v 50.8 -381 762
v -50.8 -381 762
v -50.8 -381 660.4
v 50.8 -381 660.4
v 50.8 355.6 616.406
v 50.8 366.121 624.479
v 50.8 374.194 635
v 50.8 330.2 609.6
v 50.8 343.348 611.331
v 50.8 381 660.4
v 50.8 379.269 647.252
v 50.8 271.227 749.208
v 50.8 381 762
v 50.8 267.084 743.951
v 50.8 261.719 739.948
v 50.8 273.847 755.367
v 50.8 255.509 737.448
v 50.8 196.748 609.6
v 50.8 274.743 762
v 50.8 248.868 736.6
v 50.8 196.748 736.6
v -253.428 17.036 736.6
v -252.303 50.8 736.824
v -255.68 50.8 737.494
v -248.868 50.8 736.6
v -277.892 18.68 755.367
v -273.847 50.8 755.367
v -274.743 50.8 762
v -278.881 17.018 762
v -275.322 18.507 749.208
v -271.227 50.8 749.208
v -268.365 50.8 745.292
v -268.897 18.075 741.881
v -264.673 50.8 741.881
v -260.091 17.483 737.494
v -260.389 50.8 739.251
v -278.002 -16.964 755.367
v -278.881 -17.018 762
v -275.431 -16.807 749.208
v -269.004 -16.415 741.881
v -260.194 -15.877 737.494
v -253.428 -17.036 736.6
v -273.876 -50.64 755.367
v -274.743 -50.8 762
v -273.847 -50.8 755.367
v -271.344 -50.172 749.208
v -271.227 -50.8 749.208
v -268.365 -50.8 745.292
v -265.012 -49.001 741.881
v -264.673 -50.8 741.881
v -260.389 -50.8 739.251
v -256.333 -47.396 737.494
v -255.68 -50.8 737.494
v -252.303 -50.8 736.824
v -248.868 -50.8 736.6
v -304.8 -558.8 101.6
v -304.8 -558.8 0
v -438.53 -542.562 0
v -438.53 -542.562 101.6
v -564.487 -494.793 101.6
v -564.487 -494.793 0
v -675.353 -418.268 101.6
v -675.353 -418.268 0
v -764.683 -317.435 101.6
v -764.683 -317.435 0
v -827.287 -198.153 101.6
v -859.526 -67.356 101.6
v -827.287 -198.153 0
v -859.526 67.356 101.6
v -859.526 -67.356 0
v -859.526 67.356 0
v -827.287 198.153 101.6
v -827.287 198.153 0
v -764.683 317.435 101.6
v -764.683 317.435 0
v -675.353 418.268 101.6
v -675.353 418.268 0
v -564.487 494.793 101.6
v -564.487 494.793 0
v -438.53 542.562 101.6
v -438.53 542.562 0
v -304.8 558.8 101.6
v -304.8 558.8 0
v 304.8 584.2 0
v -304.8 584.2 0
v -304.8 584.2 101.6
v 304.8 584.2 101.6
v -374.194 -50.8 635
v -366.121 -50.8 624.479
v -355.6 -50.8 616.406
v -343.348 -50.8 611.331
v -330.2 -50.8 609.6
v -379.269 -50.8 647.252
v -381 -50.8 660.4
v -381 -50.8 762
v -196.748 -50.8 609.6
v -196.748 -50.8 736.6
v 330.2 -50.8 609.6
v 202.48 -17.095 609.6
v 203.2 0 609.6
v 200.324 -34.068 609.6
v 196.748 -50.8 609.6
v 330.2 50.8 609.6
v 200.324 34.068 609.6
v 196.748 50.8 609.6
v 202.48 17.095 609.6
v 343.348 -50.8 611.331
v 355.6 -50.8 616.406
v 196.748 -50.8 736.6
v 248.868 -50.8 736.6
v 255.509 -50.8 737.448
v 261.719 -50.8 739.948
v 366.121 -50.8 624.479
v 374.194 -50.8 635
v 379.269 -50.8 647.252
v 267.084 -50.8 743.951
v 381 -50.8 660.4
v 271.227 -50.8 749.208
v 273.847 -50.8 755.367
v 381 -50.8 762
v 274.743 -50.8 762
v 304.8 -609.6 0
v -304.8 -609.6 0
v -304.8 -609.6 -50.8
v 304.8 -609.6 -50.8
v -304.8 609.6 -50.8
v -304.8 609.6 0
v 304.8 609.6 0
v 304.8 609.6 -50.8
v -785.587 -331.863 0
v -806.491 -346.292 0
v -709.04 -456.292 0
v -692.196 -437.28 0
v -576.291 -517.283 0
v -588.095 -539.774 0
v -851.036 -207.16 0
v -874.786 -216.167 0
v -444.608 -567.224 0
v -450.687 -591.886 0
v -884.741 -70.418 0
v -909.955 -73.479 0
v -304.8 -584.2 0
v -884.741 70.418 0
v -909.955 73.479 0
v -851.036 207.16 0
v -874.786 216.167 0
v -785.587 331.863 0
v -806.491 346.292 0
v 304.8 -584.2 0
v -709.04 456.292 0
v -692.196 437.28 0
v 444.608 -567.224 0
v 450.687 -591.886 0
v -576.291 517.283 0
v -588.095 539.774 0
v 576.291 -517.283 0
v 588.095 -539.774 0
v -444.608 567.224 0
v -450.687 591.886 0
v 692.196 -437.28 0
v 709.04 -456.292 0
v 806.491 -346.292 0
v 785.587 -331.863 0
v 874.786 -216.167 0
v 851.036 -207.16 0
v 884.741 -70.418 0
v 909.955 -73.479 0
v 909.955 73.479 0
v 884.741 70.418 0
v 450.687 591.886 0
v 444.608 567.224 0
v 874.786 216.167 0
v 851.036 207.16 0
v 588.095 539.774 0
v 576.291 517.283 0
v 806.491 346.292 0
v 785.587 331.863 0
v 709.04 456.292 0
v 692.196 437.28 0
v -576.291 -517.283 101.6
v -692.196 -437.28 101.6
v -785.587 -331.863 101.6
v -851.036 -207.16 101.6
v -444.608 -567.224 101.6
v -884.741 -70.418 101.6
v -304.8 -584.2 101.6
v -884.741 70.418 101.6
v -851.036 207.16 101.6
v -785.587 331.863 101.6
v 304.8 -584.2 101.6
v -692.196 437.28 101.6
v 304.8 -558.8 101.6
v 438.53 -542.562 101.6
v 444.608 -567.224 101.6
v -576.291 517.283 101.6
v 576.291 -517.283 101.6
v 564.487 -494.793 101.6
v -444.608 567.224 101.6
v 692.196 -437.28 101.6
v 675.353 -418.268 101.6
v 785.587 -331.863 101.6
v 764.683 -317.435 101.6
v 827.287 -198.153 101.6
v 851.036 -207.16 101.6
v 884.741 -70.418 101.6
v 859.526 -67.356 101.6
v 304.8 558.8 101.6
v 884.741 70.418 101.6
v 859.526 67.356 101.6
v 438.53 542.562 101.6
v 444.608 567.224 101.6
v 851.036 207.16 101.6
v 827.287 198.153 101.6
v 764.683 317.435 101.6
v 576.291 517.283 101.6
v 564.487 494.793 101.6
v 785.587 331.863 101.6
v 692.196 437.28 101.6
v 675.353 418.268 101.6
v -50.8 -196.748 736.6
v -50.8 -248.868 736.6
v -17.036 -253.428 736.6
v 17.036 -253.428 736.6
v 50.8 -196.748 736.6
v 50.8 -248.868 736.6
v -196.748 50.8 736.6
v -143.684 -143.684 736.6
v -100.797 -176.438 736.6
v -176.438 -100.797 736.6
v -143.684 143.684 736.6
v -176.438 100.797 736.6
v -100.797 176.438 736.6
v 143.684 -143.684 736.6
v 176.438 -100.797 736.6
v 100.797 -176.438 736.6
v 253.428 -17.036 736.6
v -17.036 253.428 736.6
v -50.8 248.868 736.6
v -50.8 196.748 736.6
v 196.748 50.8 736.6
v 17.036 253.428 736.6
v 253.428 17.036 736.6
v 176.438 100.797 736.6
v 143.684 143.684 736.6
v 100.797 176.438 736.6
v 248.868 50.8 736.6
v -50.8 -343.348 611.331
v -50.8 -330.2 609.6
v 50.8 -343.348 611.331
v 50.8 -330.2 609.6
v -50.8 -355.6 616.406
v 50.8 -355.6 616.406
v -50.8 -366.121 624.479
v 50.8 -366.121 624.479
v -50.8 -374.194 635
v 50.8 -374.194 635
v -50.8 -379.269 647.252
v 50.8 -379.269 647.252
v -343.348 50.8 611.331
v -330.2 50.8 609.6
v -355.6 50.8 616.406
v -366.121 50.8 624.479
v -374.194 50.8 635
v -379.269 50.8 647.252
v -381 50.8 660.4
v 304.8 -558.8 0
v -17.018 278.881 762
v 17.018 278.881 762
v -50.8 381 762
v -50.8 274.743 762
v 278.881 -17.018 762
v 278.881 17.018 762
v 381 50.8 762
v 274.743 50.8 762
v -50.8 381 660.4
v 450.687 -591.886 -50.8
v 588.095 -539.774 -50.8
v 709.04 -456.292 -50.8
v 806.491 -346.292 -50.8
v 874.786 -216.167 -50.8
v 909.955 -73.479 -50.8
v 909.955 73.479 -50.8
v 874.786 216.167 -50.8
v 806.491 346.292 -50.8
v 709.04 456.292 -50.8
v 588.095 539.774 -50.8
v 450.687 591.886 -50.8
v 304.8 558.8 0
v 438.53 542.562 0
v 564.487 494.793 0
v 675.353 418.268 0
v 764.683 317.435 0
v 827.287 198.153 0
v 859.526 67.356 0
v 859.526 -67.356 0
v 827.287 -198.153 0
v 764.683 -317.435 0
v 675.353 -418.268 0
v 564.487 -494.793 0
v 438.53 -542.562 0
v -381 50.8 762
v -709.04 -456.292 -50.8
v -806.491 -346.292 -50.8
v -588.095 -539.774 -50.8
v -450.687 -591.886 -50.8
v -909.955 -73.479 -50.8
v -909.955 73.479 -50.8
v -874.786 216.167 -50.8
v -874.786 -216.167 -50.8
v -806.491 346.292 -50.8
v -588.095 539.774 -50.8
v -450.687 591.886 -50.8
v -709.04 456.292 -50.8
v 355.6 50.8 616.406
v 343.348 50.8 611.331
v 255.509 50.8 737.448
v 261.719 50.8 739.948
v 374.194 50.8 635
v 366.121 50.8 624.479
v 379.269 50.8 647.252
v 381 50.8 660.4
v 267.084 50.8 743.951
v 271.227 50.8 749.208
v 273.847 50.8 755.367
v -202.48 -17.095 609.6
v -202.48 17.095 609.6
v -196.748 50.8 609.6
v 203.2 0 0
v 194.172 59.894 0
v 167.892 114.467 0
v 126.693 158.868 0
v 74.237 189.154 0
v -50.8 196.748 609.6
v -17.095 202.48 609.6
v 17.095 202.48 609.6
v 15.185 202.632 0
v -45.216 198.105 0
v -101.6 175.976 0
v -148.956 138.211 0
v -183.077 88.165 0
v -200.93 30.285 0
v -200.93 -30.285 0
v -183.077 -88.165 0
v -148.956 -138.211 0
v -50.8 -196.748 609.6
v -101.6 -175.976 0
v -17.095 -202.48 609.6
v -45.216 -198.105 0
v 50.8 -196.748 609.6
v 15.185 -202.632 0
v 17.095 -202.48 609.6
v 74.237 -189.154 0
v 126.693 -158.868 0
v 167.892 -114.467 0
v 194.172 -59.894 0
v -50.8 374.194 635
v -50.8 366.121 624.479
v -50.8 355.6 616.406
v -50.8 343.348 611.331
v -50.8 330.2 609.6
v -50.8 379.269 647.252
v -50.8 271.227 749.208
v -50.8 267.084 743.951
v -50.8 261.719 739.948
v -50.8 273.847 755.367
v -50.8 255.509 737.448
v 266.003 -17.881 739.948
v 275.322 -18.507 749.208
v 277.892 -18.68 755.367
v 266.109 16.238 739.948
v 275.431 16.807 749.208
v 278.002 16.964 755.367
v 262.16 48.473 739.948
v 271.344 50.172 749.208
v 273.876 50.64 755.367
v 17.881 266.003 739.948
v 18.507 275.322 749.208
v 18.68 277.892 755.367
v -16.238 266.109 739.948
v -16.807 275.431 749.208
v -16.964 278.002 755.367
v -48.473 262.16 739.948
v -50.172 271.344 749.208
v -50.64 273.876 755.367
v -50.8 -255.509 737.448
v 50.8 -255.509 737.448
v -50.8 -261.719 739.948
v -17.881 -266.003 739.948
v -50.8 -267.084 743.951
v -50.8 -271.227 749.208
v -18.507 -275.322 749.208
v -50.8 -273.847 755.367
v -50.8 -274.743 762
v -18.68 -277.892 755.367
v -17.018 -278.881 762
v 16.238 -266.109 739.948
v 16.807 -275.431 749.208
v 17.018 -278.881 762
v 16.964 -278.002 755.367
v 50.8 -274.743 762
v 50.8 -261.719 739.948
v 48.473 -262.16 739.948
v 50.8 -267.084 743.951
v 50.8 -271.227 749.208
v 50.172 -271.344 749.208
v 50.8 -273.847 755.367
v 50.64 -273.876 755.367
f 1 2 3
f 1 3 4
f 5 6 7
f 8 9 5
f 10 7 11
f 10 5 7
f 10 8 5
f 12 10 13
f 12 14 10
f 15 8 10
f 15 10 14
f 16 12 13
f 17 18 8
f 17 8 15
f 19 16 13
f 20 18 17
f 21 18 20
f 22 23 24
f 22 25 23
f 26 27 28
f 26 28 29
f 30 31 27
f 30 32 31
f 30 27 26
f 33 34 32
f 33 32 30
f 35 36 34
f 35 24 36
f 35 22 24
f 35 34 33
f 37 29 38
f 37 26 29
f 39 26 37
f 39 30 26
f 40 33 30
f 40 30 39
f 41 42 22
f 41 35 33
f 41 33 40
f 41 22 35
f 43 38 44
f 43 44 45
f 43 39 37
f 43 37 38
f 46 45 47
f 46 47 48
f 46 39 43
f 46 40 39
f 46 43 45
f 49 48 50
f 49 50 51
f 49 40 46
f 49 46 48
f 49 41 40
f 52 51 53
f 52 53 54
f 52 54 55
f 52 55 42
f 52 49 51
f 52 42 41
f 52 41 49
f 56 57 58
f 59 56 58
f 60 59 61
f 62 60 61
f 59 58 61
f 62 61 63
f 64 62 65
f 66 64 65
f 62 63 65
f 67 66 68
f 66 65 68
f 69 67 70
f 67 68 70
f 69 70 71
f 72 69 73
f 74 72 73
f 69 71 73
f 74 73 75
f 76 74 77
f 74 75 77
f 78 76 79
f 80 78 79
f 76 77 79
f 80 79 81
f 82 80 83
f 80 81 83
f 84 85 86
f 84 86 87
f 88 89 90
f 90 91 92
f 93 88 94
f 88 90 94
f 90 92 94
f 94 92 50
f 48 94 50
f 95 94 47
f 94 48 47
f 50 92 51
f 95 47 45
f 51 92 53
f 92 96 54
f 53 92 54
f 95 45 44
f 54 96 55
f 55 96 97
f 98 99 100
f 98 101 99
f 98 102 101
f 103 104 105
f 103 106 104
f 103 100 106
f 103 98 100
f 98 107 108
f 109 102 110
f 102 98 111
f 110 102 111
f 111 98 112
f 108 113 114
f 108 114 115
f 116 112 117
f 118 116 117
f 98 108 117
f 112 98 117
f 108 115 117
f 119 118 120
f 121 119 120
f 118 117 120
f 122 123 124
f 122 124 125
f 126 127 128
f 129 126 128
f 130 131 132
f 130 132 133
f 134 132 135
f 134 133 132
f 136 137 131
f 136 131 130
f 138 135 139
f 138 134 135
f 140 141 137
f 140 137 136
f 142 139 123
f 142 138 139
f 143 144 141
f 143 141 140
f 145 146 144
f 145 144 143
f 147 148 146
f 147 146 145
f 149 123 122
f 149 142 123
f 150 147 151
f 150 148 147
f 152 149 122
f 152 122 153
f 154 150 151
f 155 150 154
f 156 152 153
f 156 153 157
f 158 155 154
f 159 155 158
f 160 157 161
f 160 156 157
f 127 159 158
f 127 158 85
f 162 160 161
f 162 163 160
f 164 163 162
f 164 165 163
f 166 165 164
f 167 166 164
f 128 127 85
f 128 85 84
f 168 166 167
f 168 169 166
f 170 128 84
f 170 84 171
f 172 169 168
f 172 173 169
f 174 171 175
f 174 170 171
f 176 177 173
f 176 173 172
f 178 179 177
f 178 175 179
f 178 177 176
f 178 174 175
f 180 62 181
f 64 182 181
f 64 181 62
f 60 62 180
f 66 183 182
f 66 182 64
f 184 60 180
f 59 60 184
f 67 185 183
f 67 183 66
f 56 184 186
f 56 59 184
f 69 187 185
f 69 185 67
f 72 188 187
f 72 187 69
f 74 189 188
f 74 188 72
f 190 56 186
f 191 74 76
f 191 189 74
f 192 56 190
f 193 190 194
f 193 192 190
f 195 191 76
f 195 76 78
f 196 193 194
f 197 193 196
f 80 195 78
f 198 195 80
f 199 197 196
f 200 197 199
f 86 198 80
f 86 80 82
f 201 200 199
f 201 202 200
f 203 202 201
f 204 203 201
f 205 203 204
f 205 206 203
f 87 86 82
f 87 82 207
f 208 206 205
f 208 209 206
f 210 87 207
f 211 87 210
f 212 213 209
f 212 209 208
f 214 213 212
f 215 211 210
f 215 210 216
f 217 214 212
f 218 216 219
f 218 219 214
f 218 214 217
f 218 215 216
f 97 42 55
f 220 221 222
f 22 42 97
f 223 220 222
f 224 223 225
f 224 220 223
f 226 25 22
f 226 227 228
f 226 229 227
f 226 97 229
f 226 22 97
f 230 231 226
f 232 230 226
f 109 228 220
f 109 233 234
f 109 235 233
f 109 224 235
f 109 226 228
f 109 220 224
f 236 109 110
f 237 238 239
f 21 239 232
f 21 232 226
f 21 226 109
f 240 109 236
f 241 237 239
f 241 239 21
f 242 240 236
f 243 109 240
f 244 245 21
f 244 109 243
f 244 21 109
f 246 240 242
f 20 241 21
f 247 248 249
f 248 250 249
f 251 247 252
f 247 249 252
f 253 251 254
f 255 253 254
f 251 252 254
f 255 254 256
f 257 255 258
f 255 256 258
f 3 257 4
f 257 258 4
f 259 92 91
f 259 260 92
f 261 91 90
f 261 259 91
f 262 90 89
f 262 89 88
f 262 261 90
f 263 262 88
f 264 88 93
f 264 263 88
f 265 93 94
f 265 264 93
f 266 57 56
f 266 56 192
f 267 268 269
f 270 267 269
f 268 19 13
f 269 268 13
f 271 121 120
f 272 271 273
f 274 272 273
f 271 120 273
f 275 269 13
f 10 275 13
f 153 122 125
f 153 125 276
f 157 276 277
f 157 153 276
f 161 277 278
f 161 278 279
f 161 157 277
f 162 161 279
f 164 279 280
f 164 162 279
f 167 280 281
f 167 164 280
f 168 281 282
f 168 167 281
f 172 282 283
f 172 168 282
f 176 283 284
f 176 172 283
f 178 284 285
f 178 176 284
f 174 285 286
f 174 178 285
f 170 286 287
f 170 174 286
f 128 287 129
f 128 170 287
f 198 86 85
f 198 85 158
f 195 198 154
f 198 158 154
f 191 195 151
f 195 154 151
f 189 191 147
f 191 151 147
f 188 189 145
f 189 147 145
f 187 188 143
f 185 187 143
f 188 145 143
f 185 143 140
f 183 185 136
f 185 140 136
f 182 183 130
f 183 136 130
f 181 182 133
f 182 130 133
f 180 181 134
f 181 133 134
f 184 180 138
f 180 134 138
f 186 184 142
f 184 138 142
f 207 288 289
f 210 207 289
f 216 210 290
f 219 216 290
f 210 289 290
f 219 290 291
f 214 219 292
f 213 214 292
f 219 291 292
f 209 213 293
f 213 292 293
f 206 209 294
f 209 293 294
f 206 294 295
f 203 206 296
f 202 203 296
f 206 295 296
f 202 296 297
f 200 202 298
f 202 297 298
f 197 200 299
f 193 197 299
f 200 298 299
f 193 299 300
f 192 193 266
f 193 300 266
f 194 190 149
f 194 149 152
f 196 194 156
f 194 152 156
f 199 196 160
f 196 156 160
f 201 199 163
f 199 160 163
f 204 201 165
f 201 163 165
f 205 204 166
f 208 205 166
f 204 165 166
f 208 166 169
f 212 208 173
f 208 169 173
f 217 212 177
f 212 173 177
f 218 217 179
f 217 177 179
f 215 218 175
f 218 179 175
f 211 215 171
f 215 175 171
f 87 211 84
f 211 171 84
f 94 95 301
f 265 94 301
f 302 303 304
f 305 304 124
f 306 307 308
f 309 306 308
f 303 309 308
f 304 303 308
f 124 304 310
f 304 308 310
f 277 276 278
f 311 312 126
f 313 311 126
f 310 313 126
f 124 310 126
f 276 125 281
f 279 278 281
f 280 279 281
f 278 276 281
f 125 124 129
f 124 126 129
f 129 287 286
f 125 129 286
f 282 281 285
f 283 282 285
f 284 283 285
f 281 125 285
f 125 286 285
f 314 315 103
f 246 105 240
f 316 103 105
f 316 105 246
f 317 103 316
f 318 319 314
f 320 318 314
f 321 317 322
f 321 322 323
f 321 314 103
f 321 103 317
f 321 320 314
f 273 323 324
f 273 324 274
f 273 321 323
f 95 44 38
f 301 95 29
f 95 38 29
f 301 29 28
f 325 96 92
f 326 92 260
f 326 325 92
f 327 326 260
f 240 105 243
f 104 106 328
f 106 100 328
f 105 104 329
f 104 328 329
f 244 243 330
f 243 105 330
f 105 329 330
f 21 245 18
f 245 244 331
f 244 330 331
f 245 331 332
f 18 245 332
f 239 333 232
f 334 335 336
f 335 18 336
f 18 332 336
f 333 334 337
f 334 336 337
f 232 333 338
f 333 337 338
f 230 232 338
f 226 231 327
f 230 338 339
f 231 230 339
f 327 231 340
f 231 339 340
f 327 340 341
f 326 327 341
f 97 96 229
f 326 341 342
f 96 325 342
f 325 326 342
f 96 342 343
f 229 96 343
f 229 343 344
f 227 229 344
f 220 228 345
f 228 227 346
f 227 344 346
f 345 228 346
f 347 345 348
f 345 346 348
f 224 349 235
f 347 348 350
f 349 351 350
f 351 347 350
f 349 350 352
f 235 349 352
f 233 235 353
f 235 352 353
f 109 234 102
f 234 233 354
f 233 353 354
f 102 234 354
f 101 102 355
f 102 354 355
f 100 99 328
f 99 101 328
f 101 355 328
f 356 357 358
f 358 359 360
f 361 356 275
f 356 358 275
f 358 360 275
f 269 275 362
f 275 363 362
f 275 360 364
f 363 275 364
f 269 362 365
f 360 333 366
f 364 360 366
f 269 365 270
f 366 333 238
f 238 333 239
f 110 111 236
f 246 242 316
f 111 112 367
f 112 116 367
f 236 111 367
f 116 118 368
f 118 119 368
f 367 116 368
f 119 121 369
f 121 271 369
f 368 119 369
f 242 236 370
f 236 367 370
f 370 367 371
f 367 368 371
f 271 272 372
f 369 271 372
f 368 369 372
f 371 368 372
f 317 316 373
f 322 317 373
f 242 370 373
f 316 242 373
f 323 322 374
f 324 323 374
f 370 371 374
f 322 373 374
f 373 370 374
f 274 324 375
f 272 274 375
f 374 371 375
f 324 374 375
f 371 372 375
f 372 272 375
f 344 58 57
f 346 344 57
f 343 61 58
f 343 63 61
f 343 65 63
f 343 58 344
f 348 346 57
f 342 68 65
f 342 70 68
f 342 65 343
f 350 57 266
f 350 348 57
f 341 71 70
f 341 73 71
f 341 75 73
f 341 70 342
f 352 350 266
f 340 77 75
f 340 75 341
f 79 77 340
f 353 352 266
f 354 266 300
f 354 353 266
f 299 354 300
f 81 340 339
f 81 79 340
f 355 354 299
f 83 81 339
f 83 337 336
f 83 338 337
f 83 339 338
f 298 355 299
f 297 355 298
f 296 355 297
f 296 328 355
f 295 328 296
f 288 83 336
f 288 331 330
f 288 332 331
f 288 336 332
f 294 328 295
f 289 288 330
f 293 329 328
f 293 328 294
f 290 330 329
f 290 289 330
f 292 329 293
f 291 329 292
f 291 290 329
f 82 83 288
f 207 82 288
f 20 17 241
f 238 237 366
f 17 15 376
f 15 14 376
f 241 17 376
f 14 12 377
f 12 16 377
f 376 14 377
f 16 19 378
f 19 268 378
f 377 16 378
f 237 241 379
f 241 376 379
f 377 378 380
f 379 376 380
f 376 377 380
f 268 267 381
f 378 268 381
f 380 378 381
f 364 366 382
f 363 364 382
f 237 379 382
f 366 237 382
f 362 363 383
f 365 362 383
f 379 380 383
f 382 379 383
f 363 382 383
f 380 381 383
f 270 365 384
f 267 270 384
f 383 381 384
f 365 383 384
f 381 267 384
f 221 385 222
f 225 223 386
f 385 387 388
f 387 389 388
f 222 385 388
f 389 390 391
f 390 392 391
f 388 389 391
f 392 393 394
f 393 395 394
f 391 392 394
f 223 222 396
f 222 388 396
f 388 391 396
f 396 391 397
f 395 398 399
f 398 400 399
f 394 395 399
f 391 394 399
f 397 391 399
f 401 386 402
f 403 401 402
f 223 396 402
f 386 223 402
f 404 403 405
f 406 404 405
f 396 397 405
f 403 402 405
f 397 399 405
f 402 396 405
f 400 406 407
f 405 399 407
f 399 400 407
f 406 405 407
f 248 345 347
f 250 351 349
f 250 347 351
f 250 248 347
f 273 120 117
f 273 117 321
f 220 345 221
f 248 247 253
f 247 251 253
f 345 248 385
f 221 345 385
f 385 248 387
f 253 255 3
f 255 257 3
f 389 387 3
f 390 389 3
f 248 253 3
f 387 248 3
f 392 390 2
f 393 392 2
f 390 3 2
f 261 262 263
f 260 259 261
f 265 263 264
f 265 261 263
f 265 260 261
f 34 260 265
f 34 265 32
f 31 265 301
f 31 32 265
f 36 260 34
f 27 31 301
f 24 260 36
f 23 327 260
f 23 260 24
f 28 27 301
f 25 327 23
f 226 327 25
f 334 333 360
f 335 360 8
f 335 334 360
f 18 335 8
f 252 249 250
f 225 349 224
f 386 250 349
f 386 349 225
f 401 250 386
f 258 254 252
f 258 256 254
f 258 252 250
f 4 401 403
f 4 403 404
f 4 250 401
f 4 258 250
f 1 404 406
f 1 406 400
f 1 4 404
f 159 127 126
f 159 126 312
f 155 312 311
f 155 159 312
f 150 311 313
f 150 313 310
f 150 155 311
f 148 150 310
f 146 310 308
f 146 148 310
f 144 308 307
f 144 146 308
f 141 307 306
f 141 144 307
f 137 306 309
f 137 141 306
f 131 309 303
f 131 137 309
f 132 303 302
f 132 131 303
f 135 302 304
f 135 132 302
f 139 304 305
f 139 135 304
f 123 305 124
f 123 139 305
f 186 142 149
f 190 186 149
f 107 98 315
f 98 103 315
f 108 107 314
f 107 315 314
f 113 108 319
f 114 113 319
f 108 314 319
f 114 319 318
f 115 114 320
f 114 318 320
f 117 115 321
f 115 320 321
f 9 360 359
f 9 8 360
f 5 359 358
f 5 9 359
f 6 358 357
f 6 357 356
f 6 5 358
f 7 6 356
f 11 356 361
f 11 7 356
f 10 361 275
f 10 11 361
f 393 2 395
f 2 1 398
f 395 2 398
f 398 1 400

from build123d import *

# Parameters (mm, degrees)
F0_W      = 609.6
F0_H      = 25.4
F0_H_2    = 1117.6
F0_R      = 203.2
F1_DEPTH  = 50.8
F2_DEPTH  = 101.6
F3_DEPTH  = 762
F4_W      = 101.6
F4_H      = 152.4
F5_DEPTH  = 381
F6_W      = 101.6
F6_H      = 152.4
F7_DEPTH  = 381
F8_R      = 50.8
F9_R      = 279.4
F10_DEPTH = 25.4
F11_R     = 25.39999


# Not quite as in the source:
# - a fillet or chamfer is up to 0.001 mm smaller than in the source, because OpenCascade refuses the exact size


with BuildPart() as f1:
    # F0 (on Top) → F1 (new body)
    with BuildSketch(Plane.XY):
        with BuildLine():
            Line((-304.8, 584.2), (-304.8, 609.6))
            ThreePointArc((-304.8, 609.6), (-914.4, 0), (-304.8, -609.6))
            Line((-304.8, -609.6), (-304.8, -584.2))
            ThreePointArc((-304.8, -584.2), (-889, 0), (-304.8, 584.2))
        make_face()
        with BuildLine():
            Line((-304.8, 558.8), (-304.8, 584.2))
            ThreePointArc((-304.8, 584.2), (-889, 0), (-304.8, -584.2))
            Line((-304.8, -584.2), (-304.8, -558.8))
            ThreePointArc((-304.8, -558.8), (-863.6, 0), (-304.8, 558.8))
        make_face()
        with Locations((0, 596.9)):
            Rectangle(F0_W, F0_H)
        with BuildLine():
            ThreePointArc((304.8, -609.6), (914.4, 0), (304.8, 609.6))
            Line((304.8, 609.6), (304.8, 584.2))
            ThreePointArc((304.8, 584.2), (889, 0), (304.8, -584.2))
            Line((304.8, -584.2), (304.8, -609.6))
        make_face()
        with BuildLine():
            ThreePointArc((304.8, -584.2), (889, 0), (304.8, 584.2))
            Line((304.8, 584.2), (304.8, 558.8))
            ThreePointArc((304.8, 558.8), (863.6, 0), (304.8, -558.8))
            Line((304.8, -558.8), (304.8, -584.2))
        make_face()
        with Locations((0, -596.9)):
            Rectangle(F0_W, F0_H)
        with Locations((0, -571.5)):
            Rectangle(F0_W, F0_H)
        Rectangle(F0_W, F0_H_2)
        Circle(F0_R, mode=Mode.SUBTRACT)
        with BuildLine():
            ThreePointArc((304.8, -558.8), (863.6, 0), (304.8, 558.8))
            Line((304.8, 558.8), (304.8, -558.8))
        make_face()
        with BuildLine():
            Line((-304.8, -558.8), (-304.8, 558.8))
            ThreePointArc((-304.8, 558.8), (-863.6, 0), (-304.8, -558.8))
        make_face()
        with Locations((0, 571.5)):
            Rectangle(F0_W, F0_H)
        Circle(F0_R)
    extrude(amount=-F1_DEPTH)

    # F0 (on Top) → F2 (join)
    with BuildSketch(Plane.XY):
        with BuildLine():
            Line((-304.8, 558.8), (-304.8, 584.2))
            ThreePointArc((-304.8, 584.2), (-889, 0), (-304.8, -584.2))
            Line((-304.8, -584.2), (-304.8, -558.8))
            ThreePointArc((-304.8, -558.8), (-863.6, 0), (-304.8, 558.8))
        make_face()
        with Locations((0, -571.5)):
            Rectangle(F0_W, F0_H)
        with Locations((0, 571.5)):
            Rectangle(F0_W, F0_H)
        with BuildLine():
            ThreePointArc((304.8, -584.2), (889, 0), (304.8, 584.2))
            Line((304.8, 584.2), (304.8, 558.8))
            ThreePointArc((304.8, 558.8), (863.6, 0), (304.8, -558.8))
            Line((304.8, -558.8), (304.8, -584.2))
        make_face()
    extrude(amount=F2_DEPTH)

    # F0 (on Top) → F3 (join)
    with BuildSketch(Plane.XY):
        Circle(F0_R)
    extrude(amount=F3_DEPTH)

    # F4 (on Front) → F5 (join, symmetric)
    with BuildSketch(Plane.XZ):
        with Locations((0, 685.8)):
            Rectangle(F4_W, F4_H)
    extrude(amount=F5_DEPTH, both=True)

    # F6 (on Right) → F7 (join, symmetric)
    with BuildSketch(Plane.YZ):
        with Locations((0, 685.8)):
            Rectangle(F6_W, F6_H)
    extrude(amount=F7_DEPTH, both=True)

    # F8
    f8_edges = [f1.edges().sort_by_distance(p)[0] for p in [
        (0, -381, 609.6),
        (-381, 0, 609.6),
        (0, 381, 609.6),
        (381, 0, 609.6),
    ]]
    fillet(f8_edges, radius=F8_R)

    # F9 (on face) → F10 (cut)
    with BuildSketch(Plane.XY.offset(762)):
        Circle(F9_R)
    extrude(amount=-F10_DEPTH, mode=Mode.SUBTRACT)

    # F11 (radius 25.4 in the source; OpenCascade refuses exactly that, so slightly less here)
    f11_edges = [f1.edges().sort_by_distance(p)[0] for p in [
        (279.4, 0, 736.6),
        (-279.4, 0, 736.6),
        (0, 279.4, 736.6),
        (0, -279.4, 736.6),
    ]]
    fillet(f11_edges, radius=F11_R)


solid = f1.part
